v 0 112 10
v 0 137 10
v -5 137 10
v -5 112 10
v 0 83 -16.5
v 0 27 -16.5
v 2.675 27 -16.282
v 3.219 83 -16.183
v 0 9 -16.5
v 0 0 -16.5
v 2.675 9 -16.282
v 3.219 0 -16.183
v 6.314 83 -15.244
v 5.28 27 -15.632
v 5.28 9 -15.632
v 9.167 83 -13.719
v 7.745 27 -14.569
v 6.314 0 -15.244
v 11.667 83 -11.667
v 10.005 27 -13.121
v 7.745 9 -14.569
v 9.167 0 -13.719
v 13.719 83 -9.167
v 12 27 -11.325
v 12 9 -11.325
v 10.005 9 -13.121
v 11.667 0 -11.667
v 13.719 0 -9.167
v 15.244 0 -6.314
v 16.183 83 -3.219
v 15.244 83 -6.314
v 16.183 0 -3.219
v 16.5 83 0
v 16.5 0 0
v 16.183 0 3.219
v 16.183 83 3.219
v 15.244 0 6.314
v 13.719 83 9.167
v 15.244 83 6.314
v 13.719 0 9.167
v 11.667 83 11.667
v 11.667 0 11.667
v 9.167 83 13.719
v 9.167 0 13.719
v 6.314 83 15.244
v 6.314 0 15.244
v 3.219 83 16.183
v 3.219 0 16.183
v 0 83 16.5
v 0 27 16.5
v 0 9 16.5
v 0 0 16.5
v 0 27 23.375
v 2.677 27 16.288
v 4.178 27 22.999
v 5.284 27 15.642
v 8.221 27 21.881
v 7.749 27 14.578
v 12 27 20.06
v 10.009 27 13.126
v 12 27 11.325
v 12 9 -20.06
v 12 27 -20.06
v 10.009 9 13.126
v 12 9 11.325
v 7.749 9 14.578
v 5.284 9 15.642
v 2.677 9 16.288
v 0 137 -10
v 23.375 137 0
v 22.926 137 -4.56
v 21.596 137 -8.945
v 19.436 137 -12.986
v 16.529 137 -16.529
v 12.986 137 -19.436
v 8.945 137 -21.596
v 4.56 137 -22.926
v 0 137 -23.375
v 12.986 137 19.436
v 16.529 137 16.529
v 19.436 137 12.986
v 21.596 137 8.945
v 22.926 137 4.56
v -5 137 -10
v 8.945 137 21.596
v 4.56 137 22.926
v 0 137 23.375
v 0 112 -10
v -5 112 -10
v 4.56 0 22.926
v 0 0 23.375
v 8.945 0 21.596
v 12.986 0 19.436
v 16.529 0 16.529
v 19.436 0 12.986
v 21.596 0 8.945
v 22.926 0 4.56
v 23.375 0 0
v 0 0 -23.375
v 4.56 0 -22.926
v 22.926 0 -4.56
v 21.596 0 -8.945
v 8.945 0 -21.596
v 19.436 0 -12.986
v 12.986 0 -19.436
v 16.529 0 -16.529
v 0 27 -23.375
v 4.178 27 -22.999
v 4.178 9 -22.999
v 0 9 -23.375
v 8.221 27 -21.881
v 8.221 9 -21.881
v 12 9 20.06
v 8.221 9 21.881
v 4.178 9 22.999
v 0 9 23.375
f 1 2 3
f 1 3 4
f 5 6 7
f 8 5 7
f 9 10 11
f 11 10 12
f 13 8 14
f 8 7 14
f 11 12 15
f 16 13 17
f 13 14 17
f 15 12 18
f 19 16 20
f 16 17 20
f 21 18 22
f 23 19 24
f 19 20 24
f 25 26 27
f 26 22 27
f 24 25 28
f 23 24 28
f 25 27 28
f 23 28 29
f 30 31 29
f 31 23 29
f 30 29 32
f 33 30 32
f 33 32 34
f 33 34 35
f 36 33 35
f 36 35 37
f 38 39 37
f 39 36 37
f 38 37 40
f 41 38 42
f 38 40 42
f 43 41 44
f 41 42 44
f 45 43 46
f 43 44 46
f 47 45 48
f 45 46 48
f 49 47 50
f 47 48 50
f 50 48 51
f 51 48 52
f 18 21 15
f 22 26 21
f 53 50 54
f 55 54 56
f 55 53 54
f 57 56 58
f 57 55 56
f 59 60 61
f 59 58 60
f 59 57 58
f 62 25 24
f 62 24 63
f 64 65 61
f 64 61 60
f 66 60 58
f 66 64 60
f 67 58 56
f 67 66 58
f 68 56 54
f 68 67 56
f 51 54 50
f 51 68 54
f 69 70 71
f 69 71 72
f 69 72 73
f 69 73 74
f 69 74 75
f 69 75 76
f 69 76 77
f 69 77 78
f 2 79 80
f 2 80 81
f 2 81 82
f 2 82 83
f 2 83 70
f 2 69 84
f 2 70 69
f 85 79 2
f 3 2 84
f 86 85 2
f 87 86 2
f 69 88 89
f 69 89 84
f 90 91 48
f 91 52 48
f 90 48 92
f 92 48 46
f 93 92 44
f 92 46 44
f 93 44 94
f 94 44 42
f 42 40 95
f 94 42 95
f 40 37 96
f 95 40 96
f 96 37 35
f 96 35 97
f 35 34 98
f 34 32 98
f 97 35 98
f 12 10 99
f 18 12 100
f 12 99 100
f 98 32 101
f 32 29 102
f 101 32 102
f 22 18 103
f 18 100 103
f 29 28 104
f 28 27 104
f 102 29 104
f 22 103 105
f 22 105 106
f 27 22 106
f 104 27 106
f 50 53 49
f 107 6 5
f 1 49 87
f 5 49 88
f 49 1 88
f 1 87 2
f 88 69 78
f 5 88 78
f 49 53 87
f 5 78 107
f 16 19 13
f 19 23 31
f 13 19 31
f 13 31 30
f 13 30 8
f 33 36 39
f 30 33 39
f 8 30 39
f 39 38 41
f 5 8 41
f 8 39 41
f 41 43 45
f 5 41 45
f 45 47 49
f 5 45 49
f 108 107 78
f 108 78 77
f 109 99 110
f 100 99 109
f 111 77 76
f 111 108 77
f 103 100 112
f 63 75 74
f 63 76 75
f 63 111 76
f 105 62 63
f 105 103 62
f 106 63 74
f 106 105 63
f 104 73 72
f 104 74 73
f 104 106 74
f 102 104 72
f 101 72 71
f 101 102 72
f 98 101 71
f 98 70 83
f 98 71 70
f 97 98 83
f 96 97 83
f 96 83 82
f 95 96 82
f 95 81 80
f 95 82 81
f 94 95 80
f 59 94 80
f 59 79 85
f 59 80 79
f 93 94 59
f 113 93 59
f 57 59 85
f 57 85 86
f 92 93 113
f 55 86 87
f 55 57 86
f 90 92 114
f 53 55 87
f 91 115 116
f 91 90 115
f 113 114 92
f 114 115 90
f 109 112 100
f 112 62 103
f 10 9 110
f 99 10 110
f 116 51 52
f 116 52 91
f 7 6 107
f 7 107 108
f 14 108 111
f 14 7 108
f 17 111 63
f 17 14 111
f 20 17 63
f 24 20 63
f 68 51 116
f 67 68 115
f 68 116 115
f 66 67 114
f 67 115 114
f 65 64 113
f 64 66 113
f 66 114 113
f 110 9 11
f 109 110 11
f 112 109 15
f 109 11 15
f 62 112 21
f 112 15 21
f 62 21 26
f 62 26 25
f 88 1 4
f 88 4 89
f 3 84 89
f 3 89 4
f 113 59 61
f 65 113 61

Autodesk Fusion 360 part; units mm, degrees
sketch "Sketch1" plane through (0, 0, 0) normal (0, 1, 0) x (1, 0, 0)
  arc A0 (0, -23.375) -> (0, 23.375) centre (0, 0) ccw
  arc A1 (0, -23.375) -> (0, 23.375) centre (0, 0) ccw
  arc A2 (0, -16.5) -> (0, 16.5) centre (0, 0) ccw
  line L0 (0, 16.5) -> (0, 23.375)
  line L1 (0, -16.5) -> (0, -23.375)
extrude "Extrude1" add sketch "Sketch1" along normal blind 137
sketch "Sketch5" plane through (0, 0, 0) normal (0, -1, 0) x (1, 0, 0)
  arc A0 (0, -16.5) -> (0, 16.5) centre (0, 0) ccw
  line L0 (0, -16.5) -> (0, -23.375)
  arc A1 (0, -23.375) -> (0, 23.375) centre (0, 0) ccw
  line L1 (0, 23.375) -> (0, 16.5)
  line L2 (0, 23.375) -> (0, 16.5)
  line L3 (0, -16.5) -> (0, -23.375)
  arc A2 (0, -16.5) -> (12, -11.3248) centre (0, 0) ccw
  arc A3 (12, 11.3248) -> (0, 16.5) centre (0.0506, 0.1174) ccw
  arc A4 (12, 20.0597) -> (0, 23.375) centre (0, 0) ccw
  arc A5 (0, -23.375) -> (12, -20.0597) centre (0, 0) ccw
  line L4 (12, -11.3248) -> (12, -20.0597)
  line L5 (12, 20.0597) -> (12, 11.3248)
  dimension "d11" = 12
extrude "Extrude2" cut sketch "Sketch5" against normal blind 18 from surface at -9 contours A0 L0 A1 L3 A2 A5 L4 | A1 L1 L2 A3 A4 L5
sketch "Sketch6" plane through (0, 137, 0) normal (0, 1, 0) x (-1, 0, 0)
  arc A0 (0, 16.5) -> (0, -16.5) centre (0, 0) ccw
  line L0 (0, 16.5) -> (0, 23.375)
  arc A1 (0, 23.375) -> (0, -23.375) centre (0, 0) ccw
  line L1 (0, -23.375) -> (0, -16.5)
  arc A2 (0, 16.5) -> (0, -16.5) centre (0, 0) ccw
  line L2 (0, 16.5) -> (0, -16.5)
extrude "Extrude3" add sketch "Sketch6" against normal up to surface (54 mm away) contours A0 A2 L2
sketch "Sketch7" plane through (0, 0, 0) normal (-1, 0, 0) x (0, 0, 1)
  line L0 (-23.375, 27) -> (-16.5, 27)
  line L1 (-16.5, 27) -> (-16.5, 83)
  line L2 (-16.5, 83) -> (16.5, 83)
  line L3 (16.5, 83) -> (16.5, 27)
  line L4 (16.5, 27) -> (23.375, 27)
  line L5 (23.375, 27) -> (23.375, 137)
  line L6 (23.375, 137) -> (-23.375, 137)
  line L7 (-23.375, 137) -> (-23.375, 27)
  line L8 (-10, 137) -> (10, 137)
  line L9 (10, 137) -> (10, 112)
  line L10 (10, 112) -> (-10, 112)
  line L11 (-10, 112) -> (-10, 137)
  dimension "d18" = 25
  dimension "d19" = 20
  dimension "d20" = 13.375
extrude "Extrude4" add sketch "Sketch7" along normal blind 5 contours L6 L8 L9 L10 L11
